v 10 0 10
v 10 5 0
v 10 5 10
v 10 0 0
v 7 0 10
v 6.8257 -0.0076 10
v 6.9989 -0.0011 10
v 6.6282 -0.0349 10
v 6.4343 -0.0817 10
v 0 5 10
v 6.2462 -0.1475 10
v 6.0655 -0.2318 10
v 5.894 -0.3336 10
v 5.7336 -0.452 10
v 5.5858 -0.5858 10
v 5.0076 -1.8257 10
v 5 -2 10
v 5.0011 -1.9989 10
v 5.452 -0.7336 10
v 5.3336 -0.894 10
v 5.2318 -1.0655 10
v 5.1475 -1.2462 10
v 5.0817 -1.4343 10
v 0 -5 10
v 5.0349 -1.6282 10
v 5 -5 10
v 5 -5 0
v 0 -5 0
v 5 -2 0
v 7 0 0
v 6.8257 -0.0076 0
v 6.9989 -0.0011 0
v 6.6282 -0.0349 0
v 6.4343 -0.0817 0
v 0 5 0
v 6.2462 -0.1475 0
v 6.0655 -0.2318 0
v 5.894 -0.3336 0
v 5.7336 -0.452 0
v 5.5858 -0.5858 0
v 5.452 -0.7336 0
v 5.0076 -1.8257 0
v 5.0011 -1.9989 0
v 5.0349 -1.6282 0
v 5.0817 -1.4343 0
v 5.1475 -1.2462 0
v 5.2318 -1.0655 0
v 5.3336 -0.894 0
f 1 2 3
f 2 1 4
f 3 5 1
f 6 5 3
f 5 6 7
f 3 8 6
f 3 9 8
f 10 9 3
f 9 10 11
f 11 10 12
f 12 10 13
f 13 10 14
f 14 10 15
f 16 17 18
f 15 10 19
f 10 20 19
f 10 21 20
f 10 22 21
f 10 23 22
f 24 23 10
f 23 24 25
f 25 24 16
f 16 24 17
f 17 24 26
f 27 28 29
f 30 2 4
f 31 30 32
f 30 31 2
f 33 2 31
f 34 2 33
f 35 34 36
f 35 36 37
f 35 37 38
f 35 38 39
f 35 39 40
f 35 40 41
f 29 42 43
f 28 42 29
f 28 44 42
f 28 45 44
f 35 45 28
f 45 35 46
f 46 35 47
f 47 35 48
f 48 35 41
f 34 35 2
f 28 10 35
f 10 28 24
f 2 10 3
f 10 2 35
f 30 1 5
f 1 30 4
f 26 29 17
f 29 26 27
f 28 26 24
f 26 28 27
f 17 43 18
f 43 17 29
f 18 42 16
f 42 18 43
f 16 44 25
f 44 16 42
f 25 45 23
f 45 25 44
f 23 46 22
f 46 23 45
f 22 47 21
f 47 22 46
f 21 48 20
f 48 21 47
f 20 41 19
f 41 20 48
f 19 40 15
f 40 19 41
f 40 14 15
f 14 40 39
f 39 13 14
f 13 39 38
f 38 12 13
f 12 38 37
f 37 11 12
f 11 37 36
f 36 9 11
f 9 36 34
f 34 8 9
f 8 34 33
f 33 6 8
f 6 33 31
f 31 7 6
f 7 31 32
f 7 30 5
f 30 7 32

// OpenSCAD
// file: ../davel.scad
/*
Library to draw simple bevel borders and buttresses.

By Davide Orlandi - davide[at]davideorlandi.it

    This program is free software: you can redistribute it and/or modify
    it under the terms of the GNU Affero General Public License as
		published by the Free Software Foundation, either version 3 of
		the License, or (at your option) any later version.

    This program is distributed in the hope that it will be useful,
    but WITHOUT ANY WARRANTY; without even the implied warranty of
    MERCHANTABILITY or FITNESS FOR A PARTICULAR PURPOSE.  See the
    GNU Affero General Public License for more details.

    You should have received a copy of the GNU Affero General Public
		License along with this program.  If not, see
		<http://www.gnu.org/licenses/>.
*/


/* -------- bevel ----- */

/*
Draw a bevel.
- length: length of the bevel, longitudinally.
- n1: normal vector of the first surface.
- n2: normal vector of the second surface.
- r: radius of the bevel.
- side_offset: extra length added to the sides (optional, default 0.01).
- back offset: extra thickness added to the back of the bevel (optional, default 0.01).
*/
module davel_bevel(length, n1, n2, r, side_offset=0.01, back_offset = 0.01)
{
	assert(is_list(n1));
	assert(is_list(n2));
	
	n1n = n1 / norm(n1);
	n2n = n2 / norm(n2);
	
	assert(n1n != n2n);
	
	dir = cross(n1, n2);
	
	assert(norm(dir) > 0);
	
	dirn = dir / norm(dir);
	
	nt = n1n + n2n;
	
	assert(norm(nt) > 0);
	
	ntn = nt / norm(nt);
	ang = 90 - acos(n2n * ntn);
	c = -ntn * r / sin(ang);
	ptang1 = c + n1n * r;
	ptang2 = c + n2n * r;
		
	newz = dirn;
	newx = ntn;
	newy = cross(newz, newx);
	
	m = davel_matrix_from_columns4([newx, newy, newz]);
	m_inv = davel_transpose3(davel_matrix4_to_3(m));
	
	ptang1_off = ptang1 + n1n * back_offset;
	ptang2_off = ptang2 + n2n * back_offset;
	origin_off = ntn * back_offset;
	profile = [origin_off, ptang1_off, ptang1, ptang2, ptang2_off];
	
	// rotate the points so that what was the axis of the bevel (dir) is
	// now the z axis and the normal of the bevel (ntn) is now the x
	// axis.
	profile_derotated = davel_matrix_product_vectors3(m_inv,profile);
	c_derotated = davel_matrix_product_vector3(m_inv, c);
	
	// create a 2d list of point to use for polygon()
	profile_flat = davel_vectors3_to_2(profile_derotated);
	
	multmatrix(m)
	{
		linear_extrude(height=length + side_offset*2, center=true)
		{
			difference()
			{
				#polygon(profile_flat);
				
				translate(c_derotated) circle(r=r);
			}
		}
	}
}

/*
Draw bevels for a box.
- size: 3-dimension vector size of the box.
- r: radius of the bevel.
- center: boolean, if true the box is centered. Optional, default is false.
- front, back, top, bottom, left, right: boolean, draw or omit bevels for that
  corner. They are all optional, default is true.
- round_vert: boolean, if true draw a rounded vertex using a sphere. Optional,
  default is true.
- side_offset: extra length added to the sides of the single bevels
  (optional, default 0.01).
- back offset: extra thickness added to the back of the single bevels
  (optional, default 0.01).
*/
module davel_box_bevel(size, r, center=false, front=true, back=true, top=true, bottom=true, left=true, right=true, round_vert=true, side_offset = 0.01, back_offset = 0.01)
{	
	translate(center ? -size/2 : [0,0,0])
	{
		union()
		{
			if (top && left)
				davel_bevel_pos([0, size[1]/2, size[2]], size[1], [-1,0,0], [0,0,1], r, side_offset, back_offset);
			if (top && right)
				davel_bevel_pos([size[0], size[1]/2, size[2]], size[1], [1,0,0], [0,0,1], r, side_offset, back_offset);
			if (bottom && left)
				davel_bevel_pos([0, size[1]/2, 0], size[1], [-1,0,0], [0,0,-1], r, side_offset, back_offset);
			if (bottom && right)
				davel_bevel_pos([size[0], size[1]/2, 0], size[1], [1,0,0], [0,0,-1], r, side_offset, back_offset);
			
			if (front && top)
				davel_bevel_pos([size[0]/2, 0, size[2]], size[0], [0,-1,0], [0,0,1], r, side_offset, back_offset);
			if (front && bottom)
				davel_bevel_pos([size[0]/2, 0, 0], size[0], [0,-1,0], [0,0,-1], r, side_offset, back_offset);
			if (back && top)
				davel_bevel_pos([size[0]/2, size[1], size[2]], size[0], [0,1,0], [0,0,1], r, side_offset, back_offset);
			if (back && bottom)
				davel_bevel_pos([size[0]/2, size[1], 0], size[0], [0,1,0], [0,0,-1], r, side_offset, back_offset);
			
			if (front && left)
				davel_bevel_pos([0, 0, size[2]/2], size[2], [0,-1,0], [-1,0,0], r, side_offset, back_offset);
			if (front && right)
				davel_bevel_pos([size[0], 0, size[2]/2], size[2], [0,-1,0], [1,0,0], r, side_offset, back_offset);
			if (back && left)
				davel_bevel_pos([0, size[1], size[2]/2], size[2], [0,1,0], [-1,0,0], r, side_offset, back_offset);
			if (back && right)
				davel_bevel_pos([size[0], size[1], size[2]/2], size[2], [0,1,0], [1,0,0], r, side_offset, back_offset);
			
			if (round_vert)
			{
				if (bottom && front && left)
					davel_round_vertex([0,0,0], [-1,-1,-1], r);
				if (bottom && front && right)
					davel_round_vertex([size[0],0,0], [1,-1,-1], r);
				if (top && front && left)
					davel_round_vertex([0,0,size[2]], [-1,-1,1], r);
				if (top && front && right)
					davel_round_vertex([size[0],0,size[2]], [1,-1,1], r);
				if (bottom && back && left)
					davel_round_vertex([0,size[1],0], [-1,1,-1], r);
				if (bottom && back && right)
					davel_round_vertex([size[0],size[1],0], [1,1,-1], r);
				if (top && back && left)
					davel_round_vertex([0,size[1],size[2]], [-1,1,1], r);
				if (top && back && right)
					davel_round_vertex([size[0],size[1],size[2]], [1,1,1], r);
			}
		}
	}
}

/*
Draw a bevel, specifying its center point (so you don't need to translate()
it yourself).
- pos: 3-dimension vector position.
- length: length of the bevel, longitudinally.
- n1: normal vector of the first surface.
- n2: normal vector of the second surface.
- r: radius of the bevel.
- side_offset: extra length added to the sides (optional, default 0.01).
- back offset: extra thickness added to the back of the bevel (optional, default 0.01).
*/
module davel_bevel_pos(pos, length, n1, n2, r, side_offset=0.01, back_offset = 0.01)
{
	translate(pos) davel_bevel(length, n1, n2, r, side_offset=side_offset, back_offset=back_offset);
}

/*
Draw a bevel, specifying its side points (top and bottom
of the "cylinder") instead of center point and length.
- p1: 3-dimension vector of the first end.
- p2: 3-dimension vector of the second end.
- n1: normal vector of the first surface.
- n2: normal vector of the second surface.
- r: radius of the bevel.
- side_offset: extra length added to the sides (optional, default 0.01).
- back offset: extra thickness added to the back of the bevel (optional, default 0.01).
*/
module davel_bevel_points(p1, p2, n1, n2, r, side_offset=0.01, back_offset = 0.01)
{
	davel_bevel_pos((p1+p2)/2, norm(p2-p1), n1, n2, r, side_offset=side_offset, back_offset=back_offset);
}


/* ----- buttress ----- */

/*
Draw a buttress.
- length: length of the buttress, longitudinally.
- n1: normal vector of the first surface.
- n2: normal vector of the second surface.
- r: radius of the buttress.
- side_offset: extra length added to the sides (optional, default 0).
- back offset: extra thickness added to the back of the buttress (optional, default 0.01).
*/
module davel_buttress(length, n1, n2, r, side_offset=0, back_offset = 0.01)
{
	davel_bevel(length, -n1, -n2, r, side_offset=side_offset, back_offset=back_offset);
}

/*
Draw a buttress, specifying its center point (so you don't need to translate()
it yourself).
- pos: 3-dimension vector position.
- length: length of the buttress, longitudinally.
- n1: normal vector of the first surface.
- n2: normal vector of the second surface.
- r: radius of the buttress.
- side_offset: extra length added to the sides (optional, default 0).
- back offset: extra thickness added to the back of the buttress (optional, default 0.01).
*/
module davel_buttress_pos(pos, length, n1, n2, r, side_offset=0, back_offset=0.01)
{
	translate(pos) davel_buttress(length, n1, n2, r, side_offset=side_offset, back_offset=back_offset);
}

/*
Draw a buttress, specifying its side points (top and bottom
of the "cylinder") instead of center point and length.
- p1: 3-dimension vector of the first end.
- p2: 3-dimension vector of the second end.
- n1: normal vector of the first surface.
- n2: normal vector of the second surface.
- r: radius of the buttress.
- side_offset: extra length added to the sides (optional, default 0).
- back offset: extra thickness added to the back of the buttress (optional, default 0.01).
*/
module davel_buttress_points(p1, p2, n1, n2, r, side_offset=0, back_offset=0.01)
{
	davel_buttress_pos((p1+p2)/2, norm(p2-p1), n1, n2, r, side_offset=side_offset, back_offset=back_offset);
}

/*
Draw buttresses for a box.
- size: 3-dimension vector size of the box.
- r: radius of the buttress.
- center: boolean, if true the box is centered. Optional, default is false.
- front, back, top, bottom, left, right: boolean, draw or omit buttresses for that
  corner. They are all optional, default is true.
- round_vert: boolean, if true draw a rounded vertex using a sphere. Optional,
  default is true.
- back offset: extra thickness added to the back of the single buttresses
  (optional, default 0.01).
*/
module davel_box_buttress(size, r, center=false, front=true, back=true, top=true, bottom=true, left=true, right=true, round_vert=true, back_offset=0.01)
{
	davel_box_bevel(size, r, center, front, back, top, bottom, left, right, round_vert, side_offset=0, back_offset=back_offset);
}


// ===================== functions and "private" modules =====================

module davel_round_vertex(pos, dir, r)
{
	translate(pos - dir * r)
	{
		difference()
		{
			translate(dir * r / 2) cube(r, center=true);
			sphere(r=r);
		}
	}
}

function davel_transpose4(m) = [
	[m[0][0],m[1][0],m[2][0],m[3][0]],
  [m[0][1],m[1][1],m[2][1],m[3][1]],
	[m[0][2],m[1][2],m[2][2],m[3][2]],
	[m[0][3],m[1][3],m[2][3],m[3][3]]
];

function davel_transpose3(m) = [
	[m[0][0],m[1][0],m[2][0]],
  [m[0][1],m[1][1],m[2][1]],
	[m[0][2],m[1][2],m[2][2]]
];

function davel_matrix_product_vector3(m,v) = [
	m[0][0]*v[0] + m[0][1]*v[1] + m[0][2]*v[2],
	m[1][0]*v[0] + m[1][1]*v[1] + m[1][2]*v[2],
	m[2][0]*v[0] + m[2][1]*v[1] + m[2][2]*v[2]
];

function davel_matrix_product_vectors3(m,vectors) = [
	for (v=vectors) davel_matrix_product_vector3(m,v)
];

function davel_matrix_from_rows3(rows) = [rows[0], rows[1], rows[2]];

function davel_matrix_from_columns3(columns) = davel_transpose3(davel_matrix_from_rows3(columns));

function davel_matrix_from_rows4(rows) = [
	concat(rows[0],0),
	concat(rows[1],0),
	concat(rows[2],0),
	[0,0,0,1]
];

function davel_matrix_from_columns4(columns) = davel_transpose4(davel_matrix_from_rows4(columns));

function davel_matrix3_to_4(m) = davel_matrix_from_rows4([m[0], m[1], m[2]]);

function davel_matrix4_to_3(m) = [
	[m[0][0], m[0][1], m[0][2]],
	[m[1][0], m[1][1], m[1][2]],
	[m[2][0], m[2][1], m[2][2]]
];

function davel_vector3_to_2(v) = [v[0], v[1]];

function davel_vectors3_to_2(vectors) = [ for(v=vectors) davel_vector3_to_2(v) ];

/* ----- helper modules for debugging (draw a vector or an origin) ----- */

module davel_debug_draw_origin(alpha = 1.0)
{
	$fn = 16;
	union()
	{
		color("red", alpha)
			davel_debug_draw_vector([1,0,0], with_head=true);
		color("green", alpha)
			davel_debug_draw_vector([0,1,0], with_head=true);
		color("blue", alpha)
			davel_debug_draw_vector([0,0,1], with_head=true);
	}
}

module davel_debug_draw_vector(v, with_head=true)
{
	vl = norm(v);	// length
	b = acos(v[2] / vl);	// right ascension
	c = atan2(v[1],v[0]);	// azimuth
	rotate([0,b,c])
	{
		cylinder(r=0.01, h = vl);
		if (with_head)
		{
			translate([0,0,vl])
				cylinder(d1=0.05, d2=0, h=0.1);
		}
	}
}
// main file
/*
Usage examples of davel.scad: buttresses.

By Davide Orlandi - davide[at]davideorlandi.it

    This program is free software: you can redistribute it and/or modify
    it under the terms of the GNU Affero General Public License as
		published by the Free Software Foundation, either version 3 of
		the License, or (at your option) any later version.

    This program is distributed in the hope that it will be useful,
    but WITHOUT ANY WARRANTY; without even the implied warranty of
    MERCHANTABILITY or FITNESS FOR A PARTICULAR PURPOSE.  See the
    GNU Affero General Public License for more details.

    You should have received a copy of the GNU Affero General Public
		License along with this program.  If not, see
		<http://www.gnu.org/licenses/>.
*/

use <../davel.scad>

$fa=3;
$fs=0.2;

buttress_demo();


module buttress_demo()
{
	union()
	{
		union()
		{
			cube([10,5,10]);
			translate([0,-5,0])
				cube([5,10,10]);
		}

		/* here we are using the "*_points" version, but the basic
		version and the "*_pos" version are also available for buttresses. */
		davel_buttress_pos([5,0,5], 10, [0,-1,0], [1,0,0], 2);
		
	}
}
